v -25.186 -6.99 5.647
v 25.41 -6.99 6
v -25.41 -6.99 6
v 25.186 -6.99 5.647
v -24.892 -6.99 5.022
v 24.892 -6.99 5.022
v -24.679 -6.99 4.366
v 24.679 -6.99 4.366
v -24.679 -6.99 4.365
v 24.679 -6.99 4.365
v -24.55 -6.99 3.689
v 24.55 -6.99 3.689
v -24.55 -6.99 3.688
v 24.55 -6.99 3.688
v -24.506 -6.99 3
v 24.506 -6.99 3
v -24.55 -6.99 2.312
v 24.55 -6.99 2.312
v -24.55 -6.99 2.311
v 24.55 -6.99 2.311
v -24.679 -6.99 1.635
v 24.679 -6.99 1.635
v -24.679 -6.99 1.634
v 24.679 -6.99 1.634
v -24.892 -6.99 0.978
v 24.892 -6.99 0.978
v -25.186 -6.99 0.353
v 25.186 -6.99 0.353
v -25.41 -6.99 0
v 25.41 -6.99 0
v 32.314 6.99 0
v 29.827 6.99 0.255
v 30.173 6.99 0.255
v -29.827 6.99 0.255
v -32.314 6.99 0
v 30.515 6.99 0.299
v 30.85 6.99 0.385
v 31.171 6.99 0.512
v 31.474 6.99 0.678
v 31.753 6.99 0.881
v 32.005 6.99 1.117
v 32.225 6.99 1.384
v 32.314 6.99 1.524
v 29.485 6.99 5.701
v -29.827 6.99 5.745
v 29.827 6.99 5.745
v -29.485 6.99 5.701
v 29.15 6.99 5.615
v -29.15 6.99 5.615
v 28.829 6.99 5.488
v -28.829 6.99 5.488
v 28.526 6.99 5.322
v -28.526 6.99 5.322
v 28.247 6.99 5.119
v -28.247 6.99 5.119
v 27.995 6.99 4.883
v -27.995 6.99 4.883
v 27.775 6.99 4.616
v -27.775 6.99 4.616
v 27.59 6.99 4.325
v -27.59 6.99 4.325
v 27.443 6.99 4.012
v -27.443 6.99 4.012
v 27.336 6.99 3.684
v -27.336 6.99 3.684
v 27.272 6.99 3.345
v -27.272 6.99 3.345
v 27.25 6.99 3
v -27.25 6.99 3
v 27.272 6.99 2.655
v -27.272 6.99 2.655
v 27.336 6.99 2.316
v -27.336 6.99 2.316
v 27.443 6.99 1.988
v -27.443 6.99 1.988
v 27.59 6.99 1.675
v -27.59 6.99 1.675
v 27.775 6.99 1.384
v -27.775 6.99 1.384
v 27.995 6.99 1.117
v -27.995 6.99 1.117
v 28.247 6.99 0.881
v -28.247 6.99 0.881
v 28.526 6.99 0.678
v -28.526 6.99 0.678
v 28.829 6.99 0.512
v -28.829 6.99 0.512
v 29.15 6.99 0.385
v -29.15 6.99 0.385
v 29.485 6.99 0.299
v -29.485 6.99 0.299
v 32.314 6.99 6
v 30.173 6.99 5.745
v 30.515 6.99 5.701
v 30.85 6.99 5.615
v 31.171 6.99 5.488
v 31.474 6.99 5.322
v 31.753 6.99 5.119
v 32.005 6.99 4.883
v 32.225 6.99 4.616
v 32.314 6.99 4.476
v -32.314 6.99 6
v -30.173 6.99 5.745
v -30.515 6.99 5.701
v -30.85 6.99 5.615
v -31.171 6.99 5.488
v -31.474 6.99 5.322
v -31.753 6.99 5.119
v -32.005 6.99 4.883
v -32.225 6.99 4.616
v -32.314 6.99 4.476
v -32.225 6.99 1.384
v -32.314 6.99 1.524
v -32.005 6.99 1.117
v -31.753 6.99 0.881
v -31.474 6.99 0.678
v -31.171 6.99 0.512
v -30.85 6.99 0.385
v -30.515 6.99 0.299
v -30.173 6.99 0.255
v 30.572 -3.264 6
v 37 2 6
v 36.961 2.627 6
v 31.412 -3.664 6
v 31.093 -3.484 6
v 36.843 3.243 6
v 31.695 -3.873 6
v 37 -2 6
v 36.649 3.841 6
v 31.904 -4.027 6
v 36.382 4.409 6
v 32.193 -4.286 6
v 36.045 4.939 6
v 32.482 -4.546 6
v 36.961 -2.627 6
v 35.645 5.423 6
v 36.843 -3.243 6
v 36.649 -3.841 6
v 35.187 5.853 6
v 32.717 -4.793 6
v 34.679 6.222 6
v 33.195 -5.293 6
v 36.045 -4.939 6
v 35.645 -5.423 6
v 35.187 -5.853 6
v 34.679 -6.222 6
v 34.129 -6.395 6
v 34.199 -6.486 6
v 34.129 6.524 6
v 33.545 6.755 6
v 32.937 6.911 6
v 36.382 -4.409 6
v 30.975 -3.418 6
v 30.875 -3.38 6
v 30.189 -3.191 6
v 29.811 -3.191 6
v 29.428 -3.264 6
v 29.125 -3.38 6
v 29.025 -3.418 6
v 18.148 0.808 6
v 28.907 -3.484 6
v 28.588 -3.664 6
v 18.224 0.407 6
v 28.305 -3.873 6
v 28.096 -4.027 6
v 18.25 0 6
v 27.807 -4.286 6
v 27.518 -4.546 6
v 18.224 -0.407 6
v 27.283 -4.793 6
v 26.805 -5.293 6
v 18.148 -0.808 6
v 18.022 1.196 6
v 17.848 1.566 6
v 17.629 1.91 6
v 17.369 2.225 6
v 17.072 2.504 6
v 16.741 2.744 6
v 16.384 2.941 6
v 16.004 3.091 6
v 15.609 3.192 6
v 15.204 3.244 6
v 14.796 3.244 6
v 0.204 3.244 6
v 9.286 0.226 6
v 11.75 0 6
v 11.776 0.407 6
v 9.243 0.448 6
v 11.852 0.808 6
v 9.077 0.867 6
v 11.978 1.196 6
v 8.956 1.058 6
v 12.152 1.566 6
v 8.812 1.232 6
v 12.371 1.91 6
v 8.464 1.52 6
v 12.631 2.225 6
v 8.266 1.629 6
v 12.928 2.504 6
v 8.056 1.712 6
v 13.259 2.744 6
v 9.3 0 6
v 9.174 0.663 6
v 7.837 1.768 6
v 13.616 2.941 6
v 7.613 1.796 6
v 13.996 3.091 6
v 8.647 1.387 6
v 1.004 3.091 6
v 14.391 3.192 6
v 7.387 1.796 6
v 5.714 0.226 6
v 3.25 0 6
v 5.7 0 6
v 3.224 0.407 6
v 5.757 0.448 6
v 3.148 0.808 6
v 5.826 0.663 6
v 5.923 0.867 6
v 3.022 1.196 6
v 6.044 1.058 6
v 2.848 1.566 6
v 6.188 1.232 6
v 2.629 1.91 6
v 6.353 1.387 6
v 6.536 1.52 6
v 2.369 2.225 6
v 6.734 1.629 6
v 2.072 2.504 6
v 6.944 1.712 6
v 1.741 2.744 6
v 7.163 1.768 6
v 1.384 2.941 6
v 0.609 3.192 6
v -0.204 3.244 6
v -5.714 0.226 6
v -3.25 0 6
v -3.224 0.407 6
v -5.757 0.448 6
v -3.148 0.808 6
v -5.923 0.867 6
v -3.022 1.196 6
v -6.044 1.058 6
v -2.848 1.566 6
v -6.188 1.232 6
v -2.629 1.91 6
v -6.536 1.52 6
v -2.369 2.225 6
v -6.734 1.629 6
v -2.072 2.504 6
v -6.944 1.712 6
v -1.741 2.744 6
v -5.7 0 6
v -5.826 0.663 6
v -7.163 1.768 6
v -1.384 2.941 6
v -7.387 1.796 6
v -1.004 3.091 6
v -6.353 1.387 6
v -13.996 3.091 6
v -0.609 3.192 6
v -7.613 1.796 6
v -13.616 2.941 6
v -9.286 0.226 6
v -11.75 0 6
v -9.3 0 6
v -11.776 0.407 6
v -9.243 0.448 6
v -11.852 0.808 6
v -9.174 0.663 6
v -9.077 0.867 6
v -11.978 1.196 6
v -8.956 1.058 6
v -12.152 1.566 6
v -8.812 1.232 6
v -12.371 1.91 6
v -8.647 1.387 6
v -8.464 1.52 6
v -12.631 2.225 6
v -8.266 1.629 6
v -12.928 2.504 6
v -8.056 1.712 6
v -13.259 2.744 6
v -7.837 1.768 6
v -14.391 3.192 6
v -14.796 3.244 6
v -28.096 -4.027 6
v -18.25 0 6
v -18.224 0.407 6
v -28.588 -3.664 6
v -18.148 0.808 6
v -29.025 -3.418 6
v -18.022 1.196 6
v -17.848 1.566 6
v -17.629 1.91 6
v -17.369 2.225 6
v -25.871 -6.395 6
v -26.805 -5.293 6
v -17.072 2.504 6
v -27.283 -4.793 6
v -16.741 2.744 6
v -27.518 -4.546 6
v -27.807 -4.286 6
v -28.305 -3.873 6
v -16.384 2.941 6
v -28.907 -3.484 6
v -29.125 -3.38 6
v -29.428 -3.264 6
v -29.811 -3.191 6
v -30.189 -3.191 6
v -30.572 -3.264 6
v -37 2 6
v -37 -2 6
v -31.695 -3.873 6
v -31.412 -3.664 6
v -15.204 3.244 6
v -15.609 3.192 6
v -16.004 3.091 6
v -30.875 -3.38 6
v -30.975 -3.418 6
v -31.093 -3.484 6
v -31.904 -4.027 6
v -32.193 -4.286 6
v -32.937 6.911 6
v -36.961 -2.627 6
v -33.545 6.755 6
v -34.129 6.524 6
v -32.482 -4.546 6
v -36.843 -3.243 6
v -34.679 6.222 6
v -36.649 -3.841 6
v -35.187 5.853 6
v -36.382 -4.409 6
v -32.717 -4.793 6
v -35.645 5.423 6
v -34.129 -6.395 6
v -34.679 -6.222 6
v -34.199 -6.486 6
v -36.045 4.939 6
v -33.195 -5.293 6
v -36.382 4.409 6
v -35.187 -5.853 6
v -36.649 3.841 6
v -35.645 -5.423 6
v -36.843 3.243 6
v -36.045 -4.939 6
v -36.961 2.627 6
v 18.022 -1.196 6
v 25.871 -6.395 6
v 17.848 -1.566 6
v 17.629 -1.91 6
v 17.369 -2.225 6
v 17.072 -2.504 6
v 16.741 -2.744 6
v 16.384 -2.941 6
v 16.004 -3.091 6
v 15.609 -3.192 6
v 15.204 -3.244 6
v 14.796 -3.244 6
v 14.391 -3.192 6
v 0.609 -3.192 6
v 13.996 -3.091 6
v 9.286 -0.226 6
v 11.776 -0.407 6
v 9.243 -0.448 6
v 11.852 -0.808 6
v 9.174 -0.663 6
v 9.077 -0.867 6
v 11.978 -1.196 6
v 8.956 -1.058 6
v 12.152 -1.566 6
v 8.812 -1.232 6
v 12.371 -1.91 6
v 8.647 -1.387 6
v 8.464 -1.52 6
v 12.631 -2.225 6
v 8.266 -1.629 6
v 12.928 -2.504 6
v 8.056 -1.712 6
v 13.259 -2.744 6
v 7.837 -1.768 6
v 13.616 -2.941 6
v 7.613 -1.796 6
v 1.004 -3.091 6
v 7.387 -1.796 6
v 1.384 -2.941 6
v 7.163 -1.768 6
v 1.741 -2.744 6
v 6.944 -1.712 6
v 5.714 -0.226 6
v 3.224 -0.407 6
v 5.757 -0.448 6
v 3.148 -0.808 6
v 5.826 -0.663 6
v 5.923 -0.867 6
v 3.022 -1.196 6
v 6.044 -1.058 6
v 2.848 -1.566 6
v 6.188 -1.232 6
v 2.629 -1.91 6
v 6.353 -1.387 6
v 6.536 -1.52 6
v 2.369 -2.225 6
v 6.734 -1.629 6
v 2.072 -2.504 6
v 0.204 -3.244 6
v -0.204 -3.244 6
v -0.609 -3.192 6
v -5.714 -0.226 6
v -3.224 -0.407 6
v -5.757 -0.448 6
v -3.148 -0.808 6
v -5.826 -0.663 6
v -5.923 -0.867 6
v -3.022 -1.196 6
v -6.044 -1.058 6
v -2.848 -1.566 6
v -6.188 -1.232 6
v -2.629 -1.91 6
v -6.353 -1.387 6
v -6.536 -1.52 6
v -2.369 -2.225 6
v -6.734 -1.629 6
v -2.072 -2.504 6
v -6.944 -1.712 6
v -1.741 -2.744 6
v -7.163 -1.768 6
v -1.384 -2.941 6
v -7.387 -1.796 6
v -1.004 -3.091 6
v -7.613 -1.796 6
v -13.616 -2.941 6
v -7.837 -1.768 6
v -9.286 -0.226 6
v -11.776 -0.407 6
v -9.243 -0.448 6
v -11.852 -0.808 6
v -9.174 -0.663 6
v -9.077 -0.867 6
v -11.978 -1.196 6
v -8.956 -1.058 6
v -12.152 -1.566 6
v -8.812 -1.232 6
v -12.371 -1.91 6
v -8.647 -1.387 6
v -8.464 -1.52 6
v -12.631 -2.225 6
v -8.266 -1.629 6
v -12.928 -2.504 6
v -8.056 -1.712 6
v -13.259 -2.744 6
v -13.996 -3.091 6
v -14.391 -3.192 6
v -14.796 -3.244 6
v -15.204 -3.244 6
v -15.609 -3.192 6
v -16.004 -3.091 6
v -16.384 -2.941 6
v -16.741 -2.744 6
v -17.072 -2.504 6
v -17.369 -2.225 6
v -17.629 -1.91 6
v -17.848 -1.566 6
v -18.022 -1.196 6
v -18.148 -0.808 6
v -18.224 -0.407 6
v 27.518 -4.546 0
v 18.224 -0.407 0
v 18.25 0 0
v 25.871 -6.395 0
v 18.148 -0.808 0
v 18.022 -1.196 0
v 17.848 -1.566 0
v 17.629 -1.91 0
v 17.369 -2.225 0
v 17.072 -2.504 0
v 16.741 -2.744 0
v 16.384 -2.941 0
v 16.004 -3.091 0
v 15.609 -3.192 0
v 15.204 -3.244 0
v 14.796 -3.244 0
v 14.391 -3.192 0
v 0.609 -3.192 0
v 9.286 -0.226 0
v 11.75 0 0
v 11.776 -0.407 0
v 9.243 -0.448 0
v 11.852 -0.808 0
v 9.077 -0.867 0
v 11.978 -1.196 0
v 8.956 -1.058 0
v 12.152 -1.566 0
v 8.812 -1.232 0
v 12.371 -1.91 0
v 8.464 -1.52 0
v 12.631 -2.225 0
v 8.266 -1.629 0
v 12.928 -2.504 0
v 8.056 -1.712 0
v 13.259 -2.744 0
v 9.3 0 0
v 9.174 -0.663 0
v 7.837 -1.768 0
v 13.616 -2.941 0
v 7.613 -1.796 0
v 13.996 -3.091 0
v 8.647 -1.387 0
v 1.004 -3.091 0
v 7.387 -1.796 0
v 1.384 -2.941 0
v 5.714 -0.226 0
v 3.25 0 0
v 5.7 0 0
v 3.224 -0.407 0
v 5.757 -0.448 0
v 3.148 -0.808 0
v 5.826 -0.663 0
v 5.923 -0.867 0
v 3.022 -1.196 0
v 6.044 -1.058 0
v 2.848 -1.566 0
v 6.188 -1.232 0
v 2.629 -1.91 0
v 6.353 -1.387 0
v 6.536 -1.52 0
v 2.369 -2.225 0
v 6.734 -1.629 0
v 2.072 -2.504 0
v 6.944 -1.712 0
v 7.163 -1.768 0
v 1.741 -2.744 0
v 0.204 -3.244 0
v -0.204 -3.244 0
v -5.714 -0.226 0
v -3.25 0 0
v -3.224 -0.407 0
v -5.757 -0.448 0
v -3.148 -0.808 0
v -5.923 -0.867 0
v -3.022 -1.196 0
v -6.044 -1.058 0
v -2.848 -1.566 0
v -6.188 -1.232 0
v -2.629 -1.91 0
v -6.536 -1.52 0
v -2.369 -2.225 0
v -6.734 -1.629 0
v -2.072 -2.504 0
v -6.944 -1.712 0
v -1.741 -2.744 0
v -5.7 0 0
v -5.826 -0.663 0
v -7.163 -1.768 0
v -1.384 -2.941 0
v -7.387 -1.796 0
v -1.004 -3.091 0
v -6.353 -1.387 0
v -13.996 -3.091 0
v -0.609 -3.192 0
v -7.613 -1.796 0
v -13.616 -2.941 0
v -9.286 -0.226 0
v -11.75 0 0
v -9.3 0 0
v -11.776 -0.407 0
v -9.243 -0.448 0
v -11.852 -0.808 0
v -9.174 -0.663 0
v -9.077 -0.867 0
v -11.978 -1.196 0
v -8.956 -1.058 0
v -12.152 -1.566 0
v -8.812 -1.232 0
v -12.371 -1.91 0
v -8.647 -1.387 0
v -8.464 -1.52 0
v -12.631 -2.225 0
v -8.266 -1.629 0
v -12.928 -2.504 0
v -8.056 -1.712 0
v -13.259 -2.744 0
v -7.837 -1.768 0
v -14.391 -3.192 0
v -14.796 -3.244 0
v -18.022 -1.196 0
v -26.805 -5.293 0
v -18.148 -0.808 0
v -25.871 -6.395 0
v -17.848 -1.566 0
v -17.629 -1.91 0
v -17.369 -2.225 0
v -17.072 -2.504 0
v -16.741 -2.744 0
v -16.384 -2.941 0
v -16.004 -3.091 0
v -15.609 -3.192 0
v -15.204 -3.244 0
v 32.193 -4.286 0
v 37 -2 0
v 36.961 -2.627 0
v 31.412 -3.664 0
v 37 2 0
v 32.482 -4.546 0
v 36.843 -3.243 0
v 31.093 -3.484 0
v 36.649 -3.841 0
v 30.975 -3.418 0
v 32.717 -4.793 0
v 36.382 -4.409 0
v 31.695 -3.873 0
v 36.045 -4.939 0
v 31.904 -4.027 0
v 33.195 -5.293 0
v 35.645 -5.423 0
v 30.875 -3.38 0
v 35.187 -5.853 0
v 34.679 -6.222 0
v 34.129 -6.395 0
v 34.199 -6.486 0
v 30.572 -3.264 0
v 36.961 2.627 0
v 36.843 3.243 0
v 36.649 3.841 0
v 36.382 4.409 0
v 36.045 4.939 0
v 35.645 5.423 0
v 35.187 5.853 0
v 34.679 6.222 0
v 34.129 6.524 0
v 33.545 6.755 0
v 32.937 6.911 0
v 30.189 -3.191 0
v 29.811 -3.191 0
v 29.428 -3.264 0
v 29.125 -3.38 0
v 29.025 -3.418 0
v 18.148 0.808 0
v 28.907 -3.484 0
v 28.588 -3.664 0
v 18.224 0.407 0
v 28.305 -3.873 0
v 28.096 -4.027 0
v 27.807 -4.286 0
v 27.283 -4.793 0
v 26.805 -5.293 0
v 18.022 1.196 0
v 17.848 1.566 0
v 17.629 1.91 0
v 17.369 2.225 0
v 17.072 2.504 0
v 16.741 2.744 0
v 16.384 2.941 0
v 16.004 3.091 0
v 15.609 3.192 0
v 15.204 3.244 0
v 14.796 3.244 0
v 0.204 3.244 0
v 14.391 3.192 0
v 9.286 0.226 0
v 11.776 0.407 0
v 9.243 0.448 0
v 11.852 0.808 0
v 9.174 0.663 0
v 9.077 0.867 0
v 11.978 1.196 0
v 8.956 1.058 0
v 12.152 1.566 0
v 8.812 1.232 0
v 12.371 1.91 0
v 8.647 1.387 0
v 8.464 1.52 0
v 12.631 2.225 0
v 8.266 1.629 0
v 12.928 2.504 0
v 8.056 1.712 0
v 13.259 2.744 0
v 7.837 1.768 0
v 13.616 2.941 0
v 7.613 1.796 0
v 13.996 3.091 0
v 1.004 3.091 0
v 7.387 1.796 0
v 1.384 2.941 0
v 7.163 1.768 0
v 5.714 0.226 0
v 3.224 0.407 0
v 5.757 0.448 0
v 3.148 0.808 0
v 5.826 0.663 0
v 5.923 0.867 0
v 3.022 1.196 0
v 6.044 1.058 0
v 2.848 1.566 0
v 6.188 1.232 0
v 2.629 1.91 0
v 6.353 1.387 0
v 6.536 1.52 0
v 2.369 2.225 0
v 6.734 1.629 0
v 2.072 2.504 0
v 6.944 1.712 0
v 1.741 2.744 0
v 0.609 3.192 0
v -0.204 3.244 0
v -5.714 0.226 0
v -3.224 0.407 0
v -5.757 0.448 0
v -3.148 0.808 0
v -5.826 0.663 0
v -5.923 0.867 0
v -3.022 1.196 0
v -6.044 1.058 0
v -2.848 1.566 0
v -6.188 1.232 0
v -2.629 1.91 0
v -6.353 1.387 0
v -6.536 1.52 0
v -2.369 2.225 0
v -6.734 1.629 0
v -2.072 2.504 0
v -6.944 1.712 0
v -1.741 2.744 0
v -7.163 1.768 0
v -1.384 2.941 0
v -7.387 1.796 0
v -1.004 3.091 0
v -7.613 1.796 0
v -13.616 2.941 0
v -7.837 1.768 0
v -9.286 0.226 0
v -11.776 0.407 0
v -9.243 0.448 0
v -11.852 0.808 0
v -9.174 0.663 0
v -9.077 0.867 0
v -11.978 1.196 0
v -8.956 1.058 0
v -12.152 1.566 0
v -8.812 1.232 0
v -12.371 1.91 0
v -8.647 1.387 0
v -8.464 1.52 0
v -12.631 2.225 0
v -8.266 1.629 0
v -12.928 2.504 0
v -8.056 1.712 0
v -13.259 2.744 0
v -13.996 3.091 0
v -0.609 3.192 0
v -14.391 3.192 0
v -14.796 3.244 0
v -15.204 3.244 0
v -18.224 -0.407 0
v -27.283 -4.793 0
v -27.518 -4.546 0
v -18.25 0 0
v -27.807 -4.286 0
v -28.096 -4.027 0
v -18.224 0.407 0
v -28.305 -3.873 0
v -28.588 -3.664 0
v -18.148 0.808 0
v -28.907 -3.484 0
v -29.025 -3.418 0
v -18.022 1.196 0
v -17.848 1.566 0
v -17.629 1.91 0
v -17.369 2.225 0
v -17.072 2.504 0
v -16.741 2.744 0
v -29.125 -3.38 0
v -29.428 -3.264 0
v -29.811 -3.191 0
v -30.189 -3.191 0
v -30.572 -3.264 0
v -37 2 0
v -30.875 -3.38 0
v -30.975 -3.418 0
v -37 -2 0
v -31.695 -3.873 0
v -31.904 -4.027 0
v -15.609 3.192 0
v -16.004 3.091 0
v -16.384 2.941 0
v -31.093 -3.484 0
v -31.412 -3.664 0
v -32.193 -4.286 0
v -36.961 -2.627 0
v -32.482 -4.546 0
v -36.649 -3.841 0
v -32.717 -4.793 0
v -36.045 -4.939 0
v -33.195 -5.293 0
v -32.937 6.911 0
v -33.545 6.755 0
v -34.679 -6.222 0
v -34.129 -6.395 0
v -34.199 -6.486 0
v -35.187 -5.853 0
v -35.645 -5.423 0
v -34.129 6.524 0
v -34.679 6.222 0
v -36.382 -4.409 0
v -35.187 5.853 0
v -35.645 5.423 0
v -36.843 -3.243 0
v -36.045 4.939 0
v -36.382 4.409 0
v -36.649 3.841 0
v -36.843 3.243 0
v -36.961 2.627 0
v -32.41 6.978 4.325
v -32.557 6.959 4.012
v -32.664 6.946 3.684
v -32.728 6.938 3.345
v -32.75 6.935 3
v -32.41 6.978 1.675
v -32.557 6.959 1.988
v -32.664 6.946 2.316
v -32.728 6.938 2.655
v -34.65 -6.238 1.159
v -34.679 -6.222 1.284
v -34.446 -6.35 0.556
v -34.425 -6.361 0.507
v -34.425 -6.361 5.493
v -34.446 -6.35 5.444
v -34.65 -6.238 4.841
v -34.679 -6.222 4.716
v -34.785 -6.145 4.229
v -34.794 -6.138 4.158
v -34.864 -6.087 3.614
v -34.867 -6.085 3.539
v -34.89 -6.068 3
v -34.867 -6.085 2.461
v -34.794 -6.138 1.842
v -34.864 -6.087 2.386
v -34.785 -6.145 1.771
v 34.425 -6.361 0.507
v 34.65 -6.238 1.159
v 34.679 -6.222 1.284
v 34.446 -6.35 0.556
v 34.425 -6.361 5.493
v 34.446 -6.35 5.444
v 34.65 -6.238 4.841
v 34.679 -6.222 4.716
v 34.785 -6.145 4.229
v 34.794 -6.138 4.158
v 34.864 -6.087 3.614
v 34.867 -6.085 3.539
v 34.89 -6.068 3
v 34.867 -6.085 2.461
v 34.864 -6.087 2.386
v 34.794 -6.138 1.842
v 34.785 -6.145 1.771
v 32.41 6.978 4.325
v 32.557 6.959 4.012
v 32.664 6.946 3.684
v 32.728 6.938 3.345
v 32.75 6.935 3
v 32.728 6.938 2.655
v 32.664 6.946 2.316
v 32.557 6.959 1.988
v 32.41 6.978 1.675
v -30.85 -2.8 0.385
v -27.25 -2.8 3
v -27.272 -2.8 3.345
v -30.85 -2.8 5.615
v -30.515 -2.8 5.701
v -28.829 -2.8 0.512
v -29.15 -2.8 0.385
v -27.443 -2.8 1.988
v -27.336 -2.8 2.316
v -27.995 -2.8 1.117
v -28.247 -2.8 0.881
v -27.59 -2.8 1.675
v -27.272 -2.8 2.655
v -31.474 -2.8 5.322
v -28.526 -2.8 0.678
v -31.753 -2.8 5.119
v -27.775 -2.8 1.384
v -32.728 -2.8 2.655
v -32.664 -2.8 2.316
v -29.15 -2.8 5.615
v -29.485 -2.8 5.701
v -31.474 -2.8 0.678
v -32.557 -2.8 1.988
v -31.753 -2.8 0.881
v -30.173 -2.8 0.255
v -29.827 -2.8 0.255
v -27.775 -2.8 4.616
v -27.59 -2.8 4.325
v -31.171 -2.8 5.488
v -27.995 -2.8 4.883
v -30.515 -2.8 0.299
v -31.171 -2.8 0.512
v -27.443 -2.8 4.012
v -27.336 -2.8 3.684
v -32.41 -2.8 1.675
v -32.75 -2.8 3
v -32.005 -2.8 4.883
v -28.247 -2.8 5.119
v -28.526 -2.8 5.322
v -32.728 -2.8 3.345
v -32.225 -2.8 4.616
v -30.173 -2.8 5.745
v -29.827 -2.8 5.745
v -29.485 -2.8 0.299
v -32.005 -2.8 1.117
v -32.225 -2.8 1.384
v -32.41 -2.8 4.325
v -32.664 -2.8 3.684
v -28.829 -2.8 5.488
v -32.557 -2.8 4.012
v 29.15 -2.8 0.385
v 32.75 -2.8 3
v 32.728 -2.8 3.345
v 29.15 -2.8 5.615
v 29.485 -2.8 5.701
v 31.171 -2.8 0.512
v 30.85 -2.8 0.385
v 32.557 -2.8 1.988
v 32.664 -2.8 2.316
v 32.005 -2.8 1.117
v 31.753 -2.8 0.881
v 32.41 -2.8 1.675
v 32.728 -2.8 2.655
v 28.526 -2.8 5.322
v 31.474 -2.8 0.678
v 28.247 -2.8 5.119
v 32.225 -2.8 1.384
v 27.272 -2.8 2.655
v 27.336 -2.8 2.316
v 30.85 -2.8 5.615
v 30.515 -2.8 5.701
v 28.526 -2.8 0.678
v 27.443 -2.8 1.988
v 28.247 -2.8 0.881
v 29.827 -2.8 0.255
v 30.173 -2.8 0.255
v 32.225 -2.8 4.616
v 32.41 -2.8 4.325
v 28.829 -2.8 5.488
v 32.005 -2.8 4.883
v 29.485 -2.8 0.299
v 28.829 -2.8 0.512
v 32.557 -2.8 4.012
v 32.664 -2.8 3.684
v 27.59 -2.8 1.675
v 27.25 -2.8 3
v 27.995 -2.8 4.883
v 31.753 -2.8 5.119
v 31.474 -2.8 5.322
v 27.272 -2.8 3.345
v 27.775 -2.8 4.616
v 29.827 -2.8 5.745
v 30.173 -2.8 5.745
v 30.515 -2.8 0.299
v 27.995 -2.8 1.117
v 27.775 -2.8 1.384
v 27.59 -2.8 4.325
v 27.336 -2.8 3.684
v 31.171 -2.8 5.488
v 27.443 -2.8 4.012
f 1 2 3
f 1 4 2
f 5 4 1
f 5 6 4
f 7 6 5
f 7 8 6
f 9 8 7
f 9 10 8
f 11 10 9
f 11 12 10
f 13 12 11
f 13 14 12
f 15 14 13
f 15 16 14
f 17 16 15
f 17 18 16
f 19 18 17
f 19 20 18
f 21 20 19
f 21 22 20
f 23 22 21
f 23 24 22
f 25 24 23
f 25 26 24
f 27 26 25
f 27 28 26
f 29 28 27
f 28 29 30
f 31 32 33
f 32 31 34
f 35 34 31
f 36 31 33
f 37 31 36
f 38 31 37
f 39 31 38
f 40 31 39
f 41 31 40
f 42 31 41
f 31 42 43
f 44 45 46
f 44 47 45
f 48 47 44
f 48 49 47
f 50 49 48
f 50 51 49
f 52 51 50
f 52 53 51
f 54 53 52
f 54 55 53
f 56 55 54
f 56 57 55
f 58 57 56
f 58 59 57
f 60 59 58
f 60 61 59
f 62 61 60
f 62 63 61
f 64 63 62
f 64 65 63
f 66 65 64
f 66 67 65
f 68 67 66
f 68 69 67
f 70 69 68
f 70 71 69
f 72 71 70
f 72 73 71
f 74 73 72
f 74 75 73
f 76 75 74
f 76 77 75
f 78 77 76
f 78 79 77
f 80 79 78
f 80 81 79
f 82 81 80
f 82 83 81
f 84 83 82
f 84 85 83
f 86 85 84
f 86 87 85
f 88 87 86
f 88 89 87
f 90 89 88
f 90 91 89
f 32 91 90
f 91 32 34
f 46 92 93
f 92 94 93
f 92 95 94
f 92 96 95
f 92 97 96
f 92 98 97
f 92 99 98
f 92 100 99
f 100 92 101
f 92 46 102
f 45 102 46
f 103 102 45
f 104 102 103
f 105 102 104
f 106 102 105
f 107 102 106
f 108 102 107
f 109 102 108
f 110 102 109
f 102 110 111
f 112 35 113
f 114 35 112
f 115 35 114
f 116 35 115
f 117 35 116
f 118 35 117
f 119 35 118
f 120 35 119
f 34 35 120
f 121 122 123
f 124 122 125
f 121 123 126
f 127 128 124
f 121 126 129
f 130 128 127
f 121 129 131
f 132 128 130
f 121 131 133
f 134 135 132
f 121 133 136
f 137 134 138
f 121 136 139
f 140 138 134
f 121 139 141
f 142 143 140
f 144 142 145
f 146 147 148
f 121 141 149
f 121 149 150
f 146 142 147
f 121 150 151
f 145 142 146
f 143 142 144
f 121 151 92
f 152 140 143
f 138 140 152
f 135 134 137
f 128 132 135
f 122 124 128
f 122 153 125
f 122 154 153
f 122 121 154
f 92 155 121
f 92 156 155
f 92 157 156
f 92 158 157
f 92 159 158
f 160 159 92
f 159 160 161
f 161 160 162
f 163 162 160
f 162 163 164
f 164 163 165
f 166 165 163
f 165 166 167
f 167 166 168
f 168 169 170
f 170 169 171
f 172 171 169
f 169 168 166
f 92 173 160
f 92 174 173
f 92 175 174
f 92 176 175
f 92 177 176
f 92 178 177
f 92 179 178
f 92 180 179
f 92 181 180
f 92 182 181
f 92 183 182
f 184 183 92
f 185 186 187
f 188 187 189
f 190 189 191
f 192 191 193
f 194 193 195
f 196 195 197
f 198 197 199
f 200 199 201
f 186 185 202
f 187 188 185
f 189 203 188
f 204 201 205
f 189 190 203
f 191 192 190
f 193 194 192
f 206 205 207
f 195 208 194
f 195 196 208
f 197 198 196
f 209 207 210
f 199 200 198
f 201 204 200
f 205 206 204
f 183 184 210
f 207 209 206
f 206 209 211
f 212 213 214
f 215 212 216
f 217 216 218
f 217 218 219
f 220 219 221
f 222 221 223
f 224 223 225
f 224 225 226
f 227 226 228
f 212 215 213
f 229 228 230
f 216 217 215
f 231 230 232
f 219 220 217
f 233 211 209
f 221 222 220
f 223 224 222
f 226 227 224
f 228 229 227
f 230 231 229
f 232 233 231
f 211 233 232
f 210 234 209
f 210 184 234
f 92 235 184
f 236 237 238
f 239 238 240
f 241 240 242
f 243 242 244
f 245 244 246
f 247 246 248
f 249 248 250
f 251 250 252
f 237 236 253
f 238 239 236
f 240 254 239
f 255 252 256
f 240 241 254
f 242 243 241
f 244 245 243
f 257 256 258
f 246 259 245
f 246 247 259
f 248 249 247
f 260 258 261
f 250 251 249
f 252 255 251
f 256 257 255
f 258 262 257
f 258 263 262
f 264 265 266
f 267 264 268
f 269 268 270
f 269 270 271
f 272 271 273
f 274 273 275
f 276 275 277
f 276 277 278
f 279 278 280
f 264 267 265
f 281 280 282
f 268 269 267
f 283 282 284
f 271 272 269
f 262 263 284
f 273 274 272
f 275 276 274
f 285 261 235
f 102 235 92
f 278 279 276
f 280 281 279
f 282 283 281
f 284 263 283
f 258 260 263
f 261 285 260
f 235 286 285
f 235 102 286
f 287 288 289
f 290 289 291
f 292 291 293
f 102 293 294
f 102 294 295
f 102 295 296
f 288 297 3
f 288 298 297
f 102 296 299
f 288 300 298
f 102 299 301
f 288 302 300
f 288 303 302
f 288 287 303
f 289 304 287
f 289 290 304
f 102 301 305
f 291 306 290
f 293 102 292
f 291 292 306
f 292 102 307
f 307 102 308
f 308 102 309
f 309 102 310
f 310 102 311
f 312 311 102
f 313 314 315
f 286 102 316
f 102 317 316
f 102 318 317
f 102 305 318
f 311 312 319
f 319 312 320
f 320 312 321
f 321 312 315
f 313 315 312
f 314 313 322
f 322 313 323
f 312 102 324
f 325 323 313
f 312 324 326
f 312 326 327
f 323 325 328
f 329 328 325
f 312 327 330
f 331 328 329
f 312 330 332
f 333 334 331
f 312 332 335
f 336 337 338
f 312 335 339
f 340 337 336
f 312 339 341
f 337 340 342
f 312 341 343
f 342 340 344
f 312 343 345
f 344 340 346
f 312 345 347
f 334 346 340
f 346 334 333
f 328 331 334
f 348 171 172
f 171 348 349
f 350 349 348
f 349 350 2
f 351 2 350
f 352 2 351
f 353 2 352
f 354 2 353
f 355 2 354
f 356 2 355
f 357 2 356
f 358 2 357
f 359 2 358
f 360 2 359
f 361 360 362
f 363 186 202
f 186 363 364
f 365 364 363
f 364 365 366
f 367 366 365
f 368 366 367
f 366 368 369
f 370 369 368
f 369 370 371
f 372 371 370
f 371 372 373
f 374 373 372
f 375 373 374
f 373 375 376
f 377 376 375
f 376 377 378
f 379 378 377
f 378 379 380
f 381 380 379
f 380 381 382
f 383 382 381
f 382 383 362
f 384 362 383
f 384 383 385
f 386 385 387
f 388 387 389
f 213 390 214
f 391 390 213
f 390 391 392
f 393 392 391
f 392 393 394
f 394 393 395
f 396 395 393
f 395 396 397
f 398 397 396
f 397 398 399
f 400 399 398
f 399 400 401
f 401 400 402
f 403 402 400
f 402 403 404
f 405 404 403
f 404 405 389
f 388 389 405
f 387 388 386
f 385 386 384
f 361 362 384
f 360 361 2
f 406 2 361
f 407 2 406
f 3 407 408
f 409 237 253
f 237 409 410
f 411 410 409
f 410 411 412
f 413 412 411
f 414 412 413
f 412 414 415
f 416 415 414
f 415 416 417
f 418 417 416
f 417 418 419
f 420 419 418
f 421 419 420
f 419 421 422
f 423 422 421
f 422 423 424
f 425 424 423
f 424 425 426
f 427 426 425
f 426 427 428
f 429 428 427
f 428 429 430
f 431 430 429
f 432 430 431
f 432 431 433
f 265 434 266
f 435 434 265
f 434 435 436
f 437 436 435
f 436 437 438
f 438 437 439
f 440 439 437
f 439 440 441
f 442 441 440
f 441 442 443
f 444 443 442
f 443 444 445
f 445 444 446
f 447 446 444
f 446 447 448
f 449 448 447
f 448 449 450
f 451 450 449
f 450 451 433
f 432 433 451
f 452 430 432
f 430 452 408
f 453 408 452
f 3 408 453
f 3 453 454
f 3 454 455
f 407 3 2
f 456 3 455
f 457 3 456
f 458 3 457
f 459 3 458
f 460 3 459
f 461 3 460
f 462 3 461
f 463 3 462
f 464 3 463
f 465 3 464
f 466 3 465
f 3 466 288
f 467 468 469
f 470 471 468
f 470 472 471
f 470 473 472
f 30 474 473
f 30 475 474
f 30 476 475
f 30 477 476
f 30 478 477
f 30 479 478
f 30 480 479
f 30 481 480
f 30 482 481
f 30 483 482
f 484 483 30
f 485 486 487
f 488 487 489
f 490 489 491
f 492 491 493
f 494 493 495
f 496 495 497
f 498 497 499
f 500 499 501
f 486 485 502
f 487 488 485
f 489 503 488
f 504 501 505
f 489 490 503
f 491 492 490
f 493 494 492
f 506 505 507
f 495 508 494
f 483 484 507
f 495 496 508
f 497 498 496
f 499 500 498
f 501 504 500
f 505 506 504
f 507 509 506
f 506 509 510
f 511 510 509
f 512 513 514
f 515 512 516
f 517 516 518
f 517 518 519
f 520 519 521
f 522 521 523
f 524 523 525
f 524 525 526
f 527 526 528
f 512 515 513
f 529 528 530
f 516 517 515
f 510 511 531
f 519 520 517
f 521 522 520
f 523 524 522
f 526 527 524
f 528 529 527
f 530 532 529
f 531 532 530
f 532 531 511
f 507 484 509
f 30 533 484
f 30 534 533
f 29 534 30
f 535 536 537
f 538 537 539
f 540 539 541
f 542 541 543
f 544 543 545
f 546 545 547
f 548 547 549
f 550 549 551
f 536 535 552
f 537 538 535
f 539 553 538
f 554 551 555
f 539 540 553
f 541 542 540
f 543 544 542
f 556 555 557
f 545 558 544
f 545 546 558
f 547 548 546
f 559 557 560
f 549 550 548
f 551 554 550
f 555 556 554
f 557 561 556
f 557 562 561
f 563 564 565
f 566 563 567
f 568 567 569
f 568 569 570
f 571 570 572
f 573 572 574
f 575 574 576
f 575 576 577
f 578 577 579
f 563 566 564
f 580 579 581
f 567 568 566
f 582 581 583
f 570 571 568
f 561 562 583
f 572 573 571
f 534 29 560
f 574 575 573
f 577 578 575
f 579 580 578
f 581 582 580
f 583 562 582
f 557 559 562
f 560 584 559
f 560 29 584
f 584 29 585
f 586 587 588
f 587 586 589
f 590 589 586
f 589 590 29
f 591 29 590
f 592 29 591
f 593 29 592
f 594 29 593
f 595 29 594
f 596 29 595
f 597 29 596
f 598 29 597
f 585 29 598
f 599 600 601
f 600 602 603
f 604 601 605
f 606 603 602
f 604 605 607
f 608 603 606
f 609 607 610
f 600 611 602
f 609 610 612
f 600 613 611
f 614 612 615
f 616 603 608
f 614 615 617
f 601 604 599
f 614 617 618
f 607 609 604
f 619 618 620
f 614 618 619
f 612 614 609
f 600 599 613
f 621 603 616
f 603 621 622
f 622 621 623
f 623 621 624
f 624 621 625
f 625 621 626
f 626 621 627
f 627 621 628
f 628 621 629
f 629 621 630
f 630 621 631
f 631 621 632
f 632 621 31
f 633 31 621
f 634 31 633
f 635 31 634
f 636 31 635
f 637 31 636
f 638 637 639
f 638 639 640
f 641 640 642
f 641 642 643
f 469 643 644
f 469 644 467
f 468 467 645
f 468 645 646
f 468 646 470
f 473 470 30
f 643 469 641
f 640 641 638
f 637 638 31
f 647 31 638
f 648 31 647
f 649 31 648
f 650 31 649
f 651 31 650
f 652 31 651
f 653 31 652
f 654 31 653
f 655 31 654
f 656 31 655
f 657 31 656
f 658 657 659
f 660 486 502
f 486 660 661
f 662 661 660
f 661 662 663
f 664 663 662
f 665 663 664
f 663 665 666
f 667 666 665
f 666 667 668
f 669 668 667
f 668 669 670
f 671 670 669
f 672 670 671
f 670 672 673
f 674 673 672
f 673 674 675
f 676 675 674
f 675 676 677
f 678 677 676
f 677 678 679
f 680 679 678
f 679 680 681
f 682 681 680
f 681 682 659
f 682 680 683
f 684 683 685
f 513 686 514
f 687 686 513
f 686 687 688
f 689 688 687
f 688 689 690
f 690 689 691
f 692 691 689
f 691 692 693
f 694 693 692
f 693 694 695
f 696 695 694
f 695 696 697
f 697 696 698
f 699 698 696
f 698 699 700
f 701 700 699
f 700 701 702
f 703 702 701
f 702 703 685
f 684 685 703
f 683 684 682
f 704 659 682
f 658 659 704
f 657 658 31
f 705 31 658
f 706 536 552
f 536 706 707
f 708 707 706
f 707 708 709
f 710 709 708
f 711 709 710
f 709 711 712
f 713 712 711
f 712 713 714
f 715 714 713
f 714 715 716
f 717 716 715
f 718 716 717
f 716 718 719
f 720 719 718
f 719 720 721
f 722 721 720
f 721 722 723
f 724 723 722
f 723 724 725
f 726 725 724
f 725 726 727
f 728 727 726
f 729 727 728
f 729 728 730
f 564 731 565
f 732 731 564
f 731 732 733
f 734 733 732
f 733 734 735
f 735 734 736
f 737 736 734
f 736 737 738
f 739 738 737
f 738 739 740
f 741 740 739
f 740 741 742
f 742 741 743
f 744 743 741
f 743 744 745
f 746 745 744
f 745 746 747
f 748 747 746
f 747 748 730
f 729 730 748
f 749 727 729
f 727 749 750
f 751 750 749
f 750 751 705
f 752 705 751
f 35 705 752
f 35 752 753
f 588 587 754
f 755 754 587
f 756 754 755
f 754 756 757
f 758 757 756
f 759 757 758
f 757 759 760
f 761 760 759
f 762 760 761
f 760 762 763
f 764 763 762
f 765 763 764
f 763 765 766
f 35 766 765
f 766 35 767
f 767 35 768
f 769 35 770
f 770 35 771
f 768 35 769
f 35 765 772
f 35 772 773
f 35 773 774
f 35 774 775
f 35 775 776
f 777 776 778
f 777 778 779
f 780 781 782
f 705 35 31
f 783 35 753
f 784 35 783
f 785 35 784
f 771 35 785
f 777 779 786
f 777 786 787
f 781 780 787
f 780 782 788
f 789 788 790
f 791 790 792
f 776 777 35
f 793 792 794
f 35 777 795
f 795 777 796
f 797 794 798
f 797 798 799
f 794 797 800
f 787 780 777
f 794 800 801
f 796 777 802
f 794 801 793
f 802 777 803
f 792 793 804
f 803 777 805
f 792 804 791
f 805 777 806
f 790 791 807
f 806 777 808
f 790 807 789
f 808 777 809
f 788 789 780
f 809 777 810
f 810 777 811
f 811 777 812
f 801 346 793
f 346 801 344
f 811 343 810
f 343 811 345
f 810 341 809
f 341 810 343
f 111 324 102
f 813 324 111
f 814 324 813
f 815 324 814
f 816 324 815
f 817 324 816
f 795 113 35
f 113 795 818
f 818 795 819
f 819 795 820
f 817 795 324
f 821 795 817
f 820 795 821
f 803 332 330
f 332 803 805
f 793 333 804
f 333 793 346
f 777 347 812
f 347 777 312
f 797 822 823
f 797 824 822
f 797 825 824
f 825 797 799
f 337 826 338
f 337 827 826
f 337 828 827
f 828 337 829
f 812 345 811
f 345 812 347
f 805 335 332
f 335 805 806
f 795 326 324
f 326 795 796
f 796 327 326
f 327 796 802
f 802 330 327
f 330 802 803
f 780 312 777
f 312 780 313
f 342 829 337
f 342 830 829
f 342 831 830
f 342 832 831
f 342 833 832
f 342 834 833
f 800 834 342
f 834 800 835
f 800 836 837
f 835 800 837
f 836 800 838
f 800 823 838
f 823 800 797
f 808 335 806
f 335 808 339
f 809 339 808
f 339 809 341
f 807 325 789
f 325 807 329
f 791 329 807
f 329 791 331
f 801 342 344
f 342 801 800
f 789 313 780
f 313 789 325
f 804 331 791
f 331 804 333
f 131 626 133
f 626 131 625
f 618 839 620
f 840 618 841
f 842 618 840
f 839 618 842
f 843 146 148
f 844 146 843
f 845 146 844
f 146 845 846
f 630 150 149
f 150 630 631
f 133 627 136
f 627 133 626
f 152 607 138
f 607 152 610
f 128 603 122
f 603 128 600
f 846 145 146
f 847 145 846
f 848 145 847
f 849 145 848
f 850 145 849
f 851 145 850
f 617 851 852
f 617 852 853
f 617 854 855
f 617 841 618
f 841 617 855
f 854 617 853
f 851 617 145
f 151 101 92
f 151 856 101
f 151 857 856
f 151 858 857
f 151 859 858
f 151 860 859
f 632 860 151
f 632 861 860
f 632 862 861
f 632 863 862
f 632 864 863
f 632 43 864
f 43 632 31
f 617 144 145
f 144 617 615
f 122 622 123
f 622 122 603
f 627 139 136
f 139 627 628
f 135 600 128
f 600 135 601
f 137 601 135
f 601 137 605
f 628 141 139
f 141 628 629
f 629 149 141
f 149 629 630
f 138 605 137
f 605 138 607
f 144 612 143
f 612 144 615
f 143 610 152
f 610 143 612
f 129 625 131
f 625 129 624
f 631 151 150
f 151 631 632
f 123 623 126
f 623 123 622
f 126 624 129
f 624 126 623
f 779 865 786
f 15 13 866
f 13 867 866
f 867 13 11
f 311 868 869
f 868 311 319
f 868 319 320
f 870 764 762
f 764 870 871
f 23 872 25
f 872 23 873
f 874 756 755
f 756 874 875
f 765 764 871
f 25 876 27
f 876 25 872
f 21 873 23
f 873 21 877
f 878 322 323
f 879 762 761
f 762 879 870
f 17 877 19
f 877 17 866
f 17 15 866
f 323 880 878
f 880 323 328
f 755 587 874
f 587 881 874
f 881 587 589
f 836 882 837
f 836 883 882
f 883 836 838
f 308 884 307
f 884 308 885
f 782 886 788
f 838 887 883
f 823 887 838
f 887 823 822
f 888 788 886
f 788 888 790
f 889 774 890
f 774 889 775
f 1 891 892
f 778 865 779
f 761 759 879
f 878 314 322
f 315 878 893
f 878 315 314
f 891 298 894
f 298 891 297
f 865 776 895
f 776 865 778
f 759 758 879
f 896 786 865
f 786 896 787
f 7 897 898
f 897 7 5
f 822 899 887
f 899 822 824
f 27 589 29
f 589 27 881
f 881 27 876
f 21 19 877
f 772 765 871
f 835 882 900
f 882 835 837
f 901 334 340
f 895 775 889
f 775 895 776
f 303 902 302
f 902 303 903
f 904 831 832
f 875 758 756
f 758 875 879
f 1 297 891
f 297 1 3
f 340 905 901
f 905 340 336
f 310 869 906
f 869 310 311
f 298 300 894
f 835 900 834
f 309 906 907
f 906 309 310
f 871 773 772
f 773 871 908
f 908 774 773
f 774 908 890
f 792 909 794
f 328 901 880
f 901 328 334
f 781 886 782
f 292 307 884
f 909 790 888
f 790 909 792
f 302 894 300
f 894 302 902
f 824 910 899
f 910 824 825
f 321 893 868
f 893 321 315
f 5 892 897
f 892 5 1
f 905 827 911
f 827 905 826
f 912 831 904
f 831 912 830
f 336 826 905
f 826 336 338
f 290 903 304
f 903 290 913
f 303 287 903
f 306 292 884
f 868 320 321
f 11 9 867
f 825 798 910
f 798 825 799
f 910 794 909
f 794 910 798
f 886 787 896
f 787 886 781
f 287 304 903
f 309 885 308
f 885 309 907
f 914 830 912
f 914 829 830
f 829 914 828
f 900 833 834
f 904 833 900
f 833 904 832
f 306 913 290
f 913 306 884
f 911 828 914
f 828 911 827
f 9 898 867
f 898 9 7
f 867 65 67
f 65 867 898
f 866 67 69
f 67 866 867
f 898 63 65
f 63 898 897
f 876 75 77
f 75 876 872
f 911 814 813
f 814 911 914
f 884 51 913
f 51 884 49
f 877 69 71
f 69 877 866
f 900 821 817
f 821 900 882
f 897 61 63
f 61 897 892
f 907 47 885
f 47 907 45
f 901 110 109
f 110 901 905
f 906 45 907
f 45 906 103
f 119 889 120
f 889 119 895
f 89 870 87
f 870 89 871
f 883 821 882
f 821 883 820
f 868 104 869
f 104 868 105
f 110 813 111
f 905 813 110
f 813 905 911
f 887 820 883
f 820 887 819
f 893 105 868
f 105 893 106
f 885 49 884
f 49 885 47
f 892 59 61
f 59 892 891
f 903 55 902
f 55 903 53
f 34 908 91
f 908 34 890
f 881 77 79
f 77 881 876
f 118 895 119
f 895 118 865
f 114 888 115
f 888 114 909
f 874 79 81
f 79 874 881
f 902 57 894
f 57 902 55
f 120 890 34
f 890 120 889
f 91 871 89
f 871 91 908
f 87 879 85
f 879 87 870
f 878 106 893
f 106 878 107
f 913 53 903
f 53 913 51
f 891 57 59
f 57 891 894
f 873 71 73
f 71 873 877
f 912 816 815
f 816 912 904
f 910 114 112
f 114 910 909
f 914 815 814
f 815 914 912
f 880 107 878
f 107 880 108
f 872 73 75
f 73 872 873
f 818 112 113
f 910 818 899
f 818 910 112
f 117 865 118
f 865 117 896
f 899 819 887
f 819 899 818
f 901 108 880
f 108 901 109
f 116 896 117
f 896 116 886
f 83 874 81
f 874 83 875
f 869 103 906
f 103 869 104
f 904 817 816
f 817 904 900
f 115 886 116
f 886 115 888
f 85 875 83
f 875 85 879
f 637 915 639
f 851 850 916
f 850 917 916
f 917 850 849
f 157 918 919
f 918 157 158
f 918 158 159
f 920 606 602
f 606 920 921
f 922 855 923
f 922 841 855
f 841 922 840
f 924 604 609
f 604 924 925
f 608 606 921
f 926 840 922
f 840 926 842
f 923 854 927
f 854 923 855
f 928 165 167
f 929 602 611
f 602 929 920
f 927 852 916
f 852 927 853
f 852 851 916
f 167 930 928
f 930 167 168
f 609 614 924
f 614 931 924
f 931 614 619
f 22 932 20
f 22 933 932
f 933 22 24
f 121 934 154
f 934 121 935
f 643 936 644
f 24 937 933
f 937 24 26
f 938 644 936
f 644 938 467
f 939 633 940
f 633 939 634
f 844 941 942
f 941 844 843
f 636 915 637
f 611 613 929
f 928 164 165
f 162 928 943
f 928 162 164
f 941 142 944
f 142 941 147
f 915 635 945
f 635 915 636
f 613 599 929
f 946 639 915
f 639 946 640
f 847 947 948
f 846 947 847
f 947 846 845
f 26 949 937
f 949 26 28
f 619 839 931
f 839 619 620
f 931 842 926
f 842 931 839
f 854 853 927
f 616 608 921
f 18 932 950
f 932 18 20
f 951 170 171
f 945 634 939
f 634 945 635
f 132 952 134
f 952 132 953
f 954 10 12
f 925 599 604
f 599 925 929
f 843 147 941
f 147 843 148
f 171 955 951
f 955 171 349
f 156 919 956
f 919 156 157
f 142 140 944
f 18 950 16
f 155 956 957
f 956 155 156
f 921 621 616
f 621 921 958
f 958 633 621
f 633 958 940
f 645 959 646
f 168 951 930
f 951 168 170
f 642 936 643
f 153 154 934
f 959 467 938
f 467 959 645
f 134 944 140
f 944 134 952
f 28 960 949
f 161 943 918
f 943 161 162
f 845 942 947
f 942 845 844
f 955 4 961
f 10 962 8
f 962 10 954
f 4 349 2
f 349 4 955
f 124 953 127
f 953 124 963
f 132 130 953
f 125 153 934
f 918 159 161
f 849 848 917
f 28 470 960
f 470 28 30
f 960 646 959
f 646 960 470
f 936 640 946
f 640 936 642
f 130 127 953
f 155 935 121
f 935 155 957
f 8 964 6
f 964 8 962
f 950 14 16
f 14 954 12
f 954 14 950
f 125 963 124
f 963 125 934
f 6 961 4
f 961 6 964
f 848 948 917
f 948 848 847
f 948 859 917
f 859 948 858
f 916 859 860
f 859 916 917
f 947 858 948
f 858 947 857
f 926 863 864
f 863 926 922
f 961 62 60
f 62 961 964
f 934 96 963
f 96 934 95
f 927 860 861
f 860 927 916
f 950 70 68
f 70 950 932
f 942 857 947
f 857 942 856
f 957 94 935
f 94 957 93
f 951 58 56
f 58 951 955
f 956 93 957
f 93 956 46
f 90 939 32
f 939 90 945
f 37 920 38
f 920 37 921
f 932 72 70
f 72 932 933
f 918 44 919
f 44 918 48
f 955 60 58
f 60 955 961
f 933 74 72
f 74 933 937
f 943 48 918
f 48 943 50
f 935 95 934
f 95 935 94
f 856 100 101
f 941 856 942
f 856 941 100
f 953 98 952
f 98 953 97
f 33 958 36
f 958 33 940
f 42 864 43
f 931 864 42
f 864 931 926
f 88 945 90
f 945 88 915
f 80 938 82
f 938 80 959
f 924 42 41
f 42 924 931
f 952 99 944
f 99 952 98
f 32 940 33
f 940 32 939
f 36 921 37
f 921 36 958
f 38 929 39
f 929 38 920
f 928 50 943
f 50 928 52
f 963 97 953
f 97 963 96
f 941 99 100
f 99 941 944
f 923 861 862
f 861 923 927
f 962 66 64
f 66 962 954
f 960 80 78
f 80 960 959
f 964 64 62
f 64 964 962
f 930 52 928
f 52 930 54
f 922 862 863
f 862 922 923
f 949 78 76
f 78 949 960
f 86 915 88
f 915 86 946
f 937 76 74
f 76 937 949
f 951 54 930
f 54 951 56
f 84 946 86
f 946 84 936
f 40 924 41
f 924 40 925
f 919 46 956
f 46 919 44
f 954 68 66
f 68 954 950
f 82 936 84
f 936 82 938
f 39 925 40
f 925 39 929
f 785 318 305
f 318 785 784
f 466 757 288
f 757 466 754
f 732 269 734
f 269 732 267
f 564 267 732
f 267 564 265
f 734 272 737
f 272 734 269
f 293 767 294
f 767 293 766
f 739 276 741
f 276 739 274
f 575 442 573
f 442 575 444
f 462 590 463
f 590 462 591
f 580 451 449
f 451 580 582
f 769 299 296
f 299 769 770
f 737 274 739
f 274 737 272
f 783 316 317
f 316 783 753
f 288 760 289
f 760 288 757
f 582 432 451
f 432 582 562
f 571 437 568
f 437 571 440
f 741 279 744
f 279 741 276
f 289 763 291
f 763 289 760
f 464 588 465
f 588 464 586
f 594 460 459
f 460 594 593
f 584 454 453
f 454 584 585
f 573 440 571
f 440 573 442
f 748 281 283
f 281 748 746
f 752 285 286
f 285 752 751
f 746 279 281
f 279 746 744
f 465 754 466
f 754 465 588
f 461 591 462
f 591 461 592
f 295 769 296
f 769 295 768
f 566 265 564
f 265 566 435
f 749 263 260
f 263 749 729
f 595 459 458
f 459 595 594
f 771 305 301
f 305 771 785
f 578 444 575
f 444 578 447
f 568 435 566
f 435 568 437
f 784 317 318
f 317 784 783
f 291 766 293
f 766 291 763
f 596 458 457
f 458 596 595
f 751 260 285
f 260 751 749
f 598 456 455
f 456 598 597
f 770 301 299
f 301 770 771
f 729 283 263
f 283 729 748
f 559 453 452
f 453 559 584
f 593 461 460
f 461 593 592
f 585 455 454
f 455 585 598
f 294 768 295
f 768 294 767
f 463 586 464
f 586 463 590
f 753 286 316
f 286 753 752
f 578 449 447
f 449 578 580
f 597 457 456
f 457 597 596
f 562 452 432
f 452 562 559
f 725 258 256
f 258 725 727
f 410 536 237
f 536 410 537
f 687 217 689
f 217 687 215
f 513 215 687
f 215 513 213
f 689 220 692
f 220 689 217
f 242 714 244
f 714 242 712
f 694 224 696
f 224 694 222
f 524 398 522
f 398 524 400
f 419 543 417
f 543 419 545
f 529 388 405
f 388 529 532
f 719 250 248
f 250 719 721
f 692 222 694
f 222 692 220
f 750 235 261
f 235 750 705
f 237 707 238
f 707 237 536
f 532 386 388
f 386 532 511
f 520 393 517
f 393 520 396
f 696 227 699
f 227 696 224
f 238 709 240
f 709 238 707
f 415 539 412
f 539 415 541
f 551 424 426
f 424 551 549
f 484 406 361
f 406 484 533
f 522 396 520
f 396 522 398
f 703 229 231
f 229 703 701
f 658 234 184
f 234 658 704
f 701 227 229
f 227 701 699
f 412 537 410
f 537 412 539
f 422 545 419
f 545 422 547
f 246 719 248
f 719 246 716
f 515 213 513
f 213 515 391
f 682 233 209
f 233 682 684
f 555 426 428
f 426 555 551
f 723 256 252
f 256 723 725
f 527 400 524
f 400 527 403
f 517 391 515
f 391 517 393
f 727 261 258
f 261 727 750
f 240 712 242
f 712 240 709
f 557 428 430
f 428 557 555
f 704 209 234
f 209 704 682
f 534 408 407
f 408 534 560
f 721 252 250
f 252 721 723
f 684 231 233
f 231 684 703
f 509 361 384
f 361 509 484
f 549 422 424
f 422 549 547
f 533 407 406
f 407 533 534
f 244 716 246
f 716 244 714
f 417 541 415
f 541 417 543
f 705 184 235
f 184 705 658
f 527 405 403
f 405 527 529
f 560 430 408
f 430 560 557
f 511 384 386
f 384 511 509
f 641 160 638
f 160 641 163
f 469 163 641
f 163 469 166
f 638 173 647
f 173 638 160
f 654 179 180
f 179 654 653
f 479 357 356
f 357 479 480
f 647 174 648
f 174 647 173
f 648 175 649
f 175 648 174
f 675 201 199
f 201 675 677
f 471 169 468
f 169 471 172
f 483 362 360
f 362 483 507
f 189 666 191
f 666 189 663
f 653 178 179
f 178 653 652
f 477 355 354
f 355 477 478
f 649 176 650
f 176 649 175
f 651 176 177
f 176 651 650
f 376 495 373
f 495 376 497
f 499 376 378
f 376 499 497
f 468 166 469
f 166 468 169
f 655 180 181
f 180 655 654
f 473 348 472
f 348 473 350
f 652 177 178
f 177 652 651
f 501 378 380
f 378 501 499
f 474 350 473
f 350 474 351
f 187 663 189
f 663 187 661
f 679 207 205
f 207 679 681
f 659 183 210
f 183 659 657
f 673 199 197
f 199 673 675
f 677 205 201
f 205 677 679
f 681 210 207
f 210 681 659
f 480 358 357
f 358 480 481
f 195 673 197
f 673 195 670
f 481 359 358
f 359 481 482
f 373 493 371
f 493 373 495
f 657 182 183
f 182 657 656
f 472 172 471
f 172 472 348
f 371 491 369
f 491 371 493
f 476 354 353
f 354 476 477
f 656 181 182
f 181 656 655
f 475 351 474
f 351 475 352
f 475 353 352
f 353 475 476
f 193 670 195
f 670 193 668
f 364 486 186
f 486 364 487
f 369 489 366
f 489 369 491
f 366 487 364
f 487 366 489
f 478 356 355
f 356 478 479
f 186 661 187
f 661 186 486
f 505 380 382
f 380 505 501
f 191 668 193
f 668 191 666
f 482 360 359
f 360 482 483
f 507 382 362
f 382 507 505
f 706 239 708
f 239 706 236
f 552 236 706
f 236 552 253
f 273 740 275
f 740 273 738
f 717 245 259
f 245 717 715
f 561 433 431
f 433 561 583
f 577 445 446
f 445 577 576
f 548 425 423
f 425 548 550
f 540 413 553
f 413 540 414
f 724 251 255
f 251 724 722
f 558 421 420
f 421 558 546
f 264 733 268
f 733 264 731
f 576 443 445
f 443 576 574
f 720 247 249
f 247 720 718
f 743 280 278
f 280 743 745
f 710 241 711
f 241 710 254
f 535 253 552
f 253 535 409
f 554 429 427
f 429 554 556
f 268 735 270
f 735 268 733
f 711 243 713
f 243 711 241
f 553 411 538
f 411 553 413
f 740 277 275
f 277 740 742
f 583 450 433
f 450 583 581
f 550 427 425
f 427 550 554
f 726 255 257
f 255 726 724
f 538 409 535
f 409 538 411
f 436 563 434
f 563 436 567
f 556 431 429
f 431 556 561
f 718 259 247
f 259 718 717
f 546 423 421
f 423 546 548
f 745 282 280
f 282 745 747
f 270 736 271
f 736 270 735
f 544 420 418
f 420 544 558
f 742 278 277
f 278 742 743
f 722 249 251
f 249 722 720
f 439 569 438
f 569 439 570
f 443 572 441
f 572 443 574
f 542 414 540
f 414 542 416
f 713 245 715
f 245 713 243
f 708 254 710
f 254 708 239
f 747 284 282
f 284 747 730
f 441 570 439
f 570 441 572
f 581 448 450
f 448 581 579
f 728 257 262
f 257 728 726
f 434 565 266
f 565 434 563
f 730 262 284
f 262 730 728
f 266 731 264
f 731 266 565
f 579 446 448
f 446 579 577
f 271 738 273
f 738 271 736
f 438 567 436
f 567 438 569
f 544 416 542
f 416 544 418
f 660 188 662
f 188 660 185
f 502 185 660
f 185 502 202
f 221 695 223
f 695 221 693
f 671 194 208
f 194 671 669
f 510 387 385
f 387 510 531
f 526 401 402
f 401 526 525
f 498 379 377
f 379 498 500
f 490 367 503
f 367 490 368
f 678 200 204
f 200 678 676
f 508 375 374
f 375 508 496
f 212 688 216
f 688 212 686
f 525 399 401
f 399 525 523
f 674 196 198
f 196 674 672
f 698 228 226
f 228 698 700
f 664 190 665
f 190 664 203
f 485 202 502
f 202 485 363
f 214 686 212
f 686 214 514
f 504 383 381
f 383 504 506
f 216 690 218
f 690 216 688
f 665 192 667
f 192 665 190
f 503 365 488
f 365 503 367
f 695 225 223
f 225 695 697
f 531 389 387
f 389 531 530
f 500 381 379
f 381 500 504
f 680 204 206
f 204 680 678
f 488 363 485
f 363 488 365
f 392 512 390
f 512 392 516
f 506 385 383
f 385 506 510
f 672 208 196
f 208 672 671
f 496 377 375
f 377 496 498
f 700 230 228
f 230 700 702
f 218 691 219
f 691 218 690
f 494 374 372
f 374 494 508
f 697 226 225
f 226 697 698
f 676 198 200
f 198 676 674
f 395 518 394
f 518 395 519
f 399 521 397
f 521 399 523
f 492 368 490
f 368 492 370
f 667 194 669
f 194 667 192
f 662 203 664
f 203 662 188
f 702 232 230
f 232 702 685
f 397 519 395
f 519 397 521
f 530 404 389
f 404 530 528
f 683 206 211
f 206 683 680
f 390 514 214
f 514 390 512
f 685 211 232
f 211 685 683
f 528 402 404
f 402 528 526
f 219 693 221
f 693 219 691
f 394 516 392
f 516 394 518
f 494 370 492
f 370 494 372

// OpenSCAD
$fn = 50;


difference() {
	union() {
		hull() {
			translate(v = [-17.0000000000, 2.0000000000, 0]) {
				cylinder(h = 6, r = 5);
			}
			translate(v = [17.0000000000, 2.0000000000, 0]) {
				cylinder(h = 6, r = 5);
			}
			translate(v = [-17.0000000000, -2.0000000000, 0]) {
				cylinder(h = 6, r = 5);
			}
			translate(v = [17.0000000000, -2.0000000000, 0]) {
				cylinder(h = 6, r = 5);
			}
		}
		translate(v = [-22.5000000000, 0.0000000000, 0]) {
			hull() {
				translate(v = [-9.5000000000, 2.0000000000, 0]) {
					cylinder(h = 6, r = 5);
				}
				translate(v = [9.5000000000, 2.0000000000, 0]) {
					cylinder(h = 6, r = 5);
				}
				translate(v = [-9.5000000000, -2.0000000000, 0]) {
					cylinder(h = 6, r = 5);
				}
				translate(v = [9.5000000000, -2.0000000000, 0]) {
					cylinder(h = 6, r = 5);
				}
			}
		}
		translate(v = [-22.5000000000, 0.0000000000, 0]) {
			hull() {
				translate(v = [-9.5000000000, 2.0000000000, 0]) {
					cylinder(h = 6, r = 5);
				}
				translate(v = [9.5000000000, 2.0000000000, 0]) {
					cylinder(h = 6, r = 5);
				}
				translate(v = [-9.5000000000, -2.0000000000, 0]) {
					cylinder(h = 6, r = 5);
				}
				translate(v = [9.5000000000, -2.0000000000, 0]) {
					cylinder(h = 6, r = 5);
				}
			}
		}
		translate(v = [22.5000000000, 0.0000000000, 0]) {
			hull() {
				translate(v = [-9.5000000000, 2.0000000000, 0]) {
					cylinder(h = 6, r = 5);
				}
				translate(v = [9.5000000000, 2.0000000000, 0]) {
					cylinder(h = 6, r = 5);
				}
				translate(v = [-9.5000000000, -2.0000000000, 0]) {
					cylinder(h = 6, r = 5);
				}
				translate(v = [9.5000000000, -2.0000000000, 0]) {
					cylinder(h = 6, r = 5);
				}
			}
		}
		translate(v = [22.5000000000, 0.0000000000, 0]) {
			hull() {
				translate(v = [-9.5000000000, 2.0000000000, 0]) {
					cylinder(h = 6, r = 5);
				}
				translate(v = [9.5000000000, 2.0000000000, 0]) {
					cylinder(h = 6, r = 5);
				}
				translate(v = [-9.5000000000, -2.0000000000, 0]) {
					cylinder(h = 6, r = 5);
				}
				translate(v = [9.5000000000, -2.0000000000, 0]) {
					cylinder(h = 6, r = 5);
				}
			}
		}
	}
	union() {
		translate(v = [-30.0000000000, -7.0000000000, 3.0000000000]) {
			rotate(a = [90, 0, 0]) {
				difference() {
					union() {
						#translate(v = [0, 0, -14.0000000000]) {
							cylinder(h = 14, r = 2.2500000000);
						}
						#translate(v = [0, 0, -4.2000000000]) {
							cylinder(h = 4.2000000000, r1 = 2.7500000000, r2 = 5.5000000000);
						}
						#translate(v = [0, 0, -14.0000000000]) {
							cylinder(h = 14, r = 2.7500000000);
						}
						#translate(v = [0, 0, -14.0000000000]) {
							cylinder(h = 14, r = 2.2500000000);
						}
					}
					union();
				}
			}
		}
		translate(v = [30.0000000000, -7.0000000000, 3.0000000000]) {
			rotate(a = [90, 0, 0]) {
				difference() {
					union() {
						#translate(v = [0, 0, -14.0000000000]) {
							cylinder(h = 14, r = 2.2500000000);
						}
						#translate(v = [0, 0, -4.2000000000]) {
							cylinder(h = 4.2000000000, r1 = 2.7500000000, r2 = 5.5000000000);
						}
						#translate(v = [0, 0, -14.0000000000]) {
							cylinder(h = 14, r = 2.7500000000);
						}
						#translate(v = [0, 0, -14.0000000000]) {
							cylinder(h = 14, r = 2.2500000000);
						}
					}
					union();
				}
			}
		}
		translate(v = [-15.0000000000, 0.0000000000, 0]) {
			translate(v = [0, 0, -100]) {
				cylinder(h = 200, r = 3.2500000000);
			}
		}
		translate(v = [0, 0, -100]) {
			cylinder(h = 200, r = 3.2500000000);
		}
		translate(v = [15.0000000000, 0.0000000000, 0]) {
			translate(v = [0, 0, -100]) {
				cylinder(h = 200, r = 3.2500000000);
			}
		}
		translate(v = [-15.0000000000, 0.0000000000, 0]) {
			translate(v = [0, 0, -100]) {
				cylinder(h = 200, r = 1.8000000000);
			}
		}
		translate(v = [-7.5000000000, 0.0000000000, 0]) {
			translate(v = [0, 0, -100]) {
				cylinder(h = 200, r = 1.8000000000);
			}
		}
		translate(v = [0, 0, -100]) {
			cylinder(h = 200, r = 1.8000000000);
		}
		translate(v = [7.5000000000, 0.0000000000, 0]) {
			translate(v = [0, 0, -100]) {
				cylinder(h = 200, r = 1.8000000000);
			}
		}
		translate(v = [15.0000000000, 0.0000000000, 0]) {
			translate(v = [0, 0, -100]) {
				cylinder(h = 200, r = 1.8000000000);
			}
		}
	}
}
